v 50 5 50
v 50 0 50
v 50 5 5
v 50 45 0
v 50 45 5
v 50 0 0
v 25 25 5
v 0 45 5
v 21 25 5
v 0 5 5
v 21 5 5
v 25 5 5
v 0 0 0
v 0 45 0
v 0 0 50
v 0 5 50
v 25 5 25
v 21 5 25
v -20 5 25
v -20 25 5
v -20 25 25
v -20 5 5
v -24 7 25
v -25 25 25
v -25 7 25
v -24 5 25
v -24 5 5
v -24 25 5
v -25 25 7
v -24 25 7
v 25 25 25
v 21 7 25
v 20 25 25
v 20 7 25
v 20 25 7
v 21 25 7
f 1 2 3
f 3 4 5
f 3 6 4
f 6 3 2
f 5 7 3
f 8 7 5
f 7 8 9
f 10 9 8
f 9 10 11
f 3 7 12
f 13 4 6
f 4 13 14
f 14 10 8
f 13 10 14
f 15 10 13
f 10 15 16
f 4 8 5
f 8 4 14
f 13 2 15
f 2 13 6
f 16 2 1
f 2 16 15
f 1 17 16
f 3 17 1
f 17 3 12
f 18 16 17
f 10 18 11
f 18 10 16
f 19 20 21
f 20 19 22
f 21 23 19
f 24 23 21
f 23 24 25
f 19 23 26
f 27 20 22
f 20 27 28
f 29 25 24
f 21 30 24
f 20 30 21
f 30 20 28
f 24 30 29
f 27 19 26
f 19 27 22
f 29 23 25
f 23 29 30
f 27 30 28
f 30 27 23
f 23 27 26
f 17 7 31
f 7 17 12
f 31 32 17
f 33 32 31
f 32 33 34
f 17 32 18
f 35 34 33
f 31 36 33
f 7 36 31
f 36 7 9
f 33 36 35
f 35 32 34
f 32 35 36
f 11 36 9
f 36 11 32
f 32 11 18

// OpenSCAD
// L-shaped mounting bracket for NEMA 17 stepper motor
// Print orientation: base plate on bed (z = 0), builds upward

// Dimensions
base_x_min = -25;
base_x_max = 25;
base_y_min = 0;
base_y_max = 45;
base_z = 5;

motor_plate_x_min = -25;
motor_plate_x_max = 25;
motor_plate_y_min = 0;
motor_plate_y_max = 5;
motor_plate_z = 50;

// Hole positions
m4_hole_diameter = 4.5;
m4_hole1_x = -17;
m4_hole1_y = 30;
m4_hole2_x = 17;
m4_hole2_y = 30;

// Motor boss hole
boss_hole_diameter = 23;
boss_hole_center_x = 0;
boss_hole_center_z = 28;

// M3 screw holes for motor mounting
m3_hole_diameter = 3.4;
m3_screw_spacing = 31;
m3_hole_offset = m3_screw_spacing / 2;

// Gussets
gusset_thickness = 5;
gusset_leg_length = 20;
gusset_base_y = 5;
gusset_base_z = 5;

// Set resolution for smooth curves
$fn = 64;

// Main module
module bracket() {
    // Base plate (on XY plane, z = 0 to 5)
    translate([0, 0, 0])
        cube([base_x_max - base_x_min, base_y_max - base_y_min, base_z], center = false);

    // Motor plate (attached to back edge of base plate, y = 0 to 5, z = 0 to 50)
    translate([0, 0, 0])
        cube([motor_plate_x_max - motor_plate_x_min, motor_plate_y_max - motor_plate_y_min, motor_plate_z], center = false);

    // Cut boss hole through both plates (centered at x=0, z=28, y=0 to 5)
    difference() {
        // Union of base and motor plate
        union() {
            translate([0, 0, 0])
                cube([base_x_max - base_x_min, base_y_max - base_y_min, base_z], center = false);
            translate([0, 0, 0])
                cube([motor_plate_x_max - motor_plate_x_min, motor_plate_y_max - motor_plate_y_min, motor_plate_z], center = false);
        }

        // Boss hole: cylinder through both plates
        translate([boss_hole_center_x, 0, boss_hole_center_z])
            cylinder(h = base_z + motor_plate_z + 1, r = boss_hole_diameter / 2, center = true);
    }

    // Cut M3 screw holes through both plates (in a square around boss hole)
    for (i = [0:1:3]) {
        angle = i * 90;
        x_offset = m3_hole_offset * cos(angle * 3.141592653589793 / 180);
        y_offset = m3_hole_offset * sin(angle * 3.141592653589793 / 180);
        hole_x = boss_hole_center_x + x_offset;
        hole_z = boss_hole_center_z + y_offset;

        difference() {
            // Union of base and motor plate
            union() {
                translate([0, 0, 0])
                    cube([base_x_max - base_x_min, base_y_max - base_y_min, base_z], center = false);
                translate([0, 0, 0])
                    cube([motor_plate_x_max - motor_plate_x_min, motor_plate_y_max - motor_plate_y_min, motor_plate_z], center = false);
            }

            // M3 hole: cylinder through both plates
            translate([hole_x, 0, hole_z])
                cylinder(h = base_z + motor_plate_z + 1, r = m3_hole_diameter / 2, center = true);
        }
    }

    // Cut M4 through-holes in base plate (at y = 30, z = 0 to 5)
    difference() {
        // Base plate
        translate([0, 0, 0])
            cube([base_x_max - base_x_min, base_y_max - base_y_min, base_z], center = false);

        // M4 hole 1
        translate([m4_hole1_x, m4_hole1_y, base_z / 2])
            cylinder(h = base_z + 1, r = m4_hole_diameter / 2, center = true);

        // M4 hole 2
        translate([m4_hole2_x, m4_hole2_y, base_z / 2])
            cylinder(h = base_z + 1, r = m4_hole_diameter / 2, center = true);
    }

    // Gussets: right triangle in YZ plane, legs 20mm, thickness 5mm
    // Left gusset: x = -25 to -20, y = 5 to 25, z = 5 to 25
    // Right gusset: x = 20 to 25, y = 5 to 25, z = 5 to 25

    // Left gusset: right triangle in YZ plane, right angle at (y=5, z=5), extending +Y and +Z
    // Use hull to form the triangular prism
    difference() {
        // Full rectangular prism for left gusset
        translate([-25, 5, 5])
            cube([5, gusset_leg_length, gusset_leg_length], center = false);

        // Cut away the non-triangular part: remove the top-left triangle
        // Use a negative pyramid (inverted hull) to remove the non-gusset region
        // Instead, use a hull of three points to define the gusset directly
        hull() {
            translate([-25, 5, 5]) cube([1, 1, 1], center = false); // corner at (y=5, z=5)
            translate([-25, 5 + gusset_leg_length, 5]) cube([1, 1, 1], center = false); // (y=25, z=5)
            translate([-25, 5, 5 + gusset_leg_length]) cube([1, 1, 1], center = false); // (y=5, z=25)
        }
    }

    // Right gusset: same shape but at x = 20 to 25
    difference() {
        // Full rectangular prism for right gusset
        translate([20, 5, 5])
            cube([5, gusset_leg_length, gusset_leg_length], center = false);

        // Hull to form the right triangle
        hull() {
            translate([20, 5, 5]) cube([1, 1, 1], center = false);
            translate([20, 5 + gusset_leg_length, 5]) cube([1, 1, 1], center = false);
            translate([20, 5, 5 + gusset_leg_length]) cube([1, 1, 1], center = false);
        }
    }
}

// Render the bracket
bracket();
